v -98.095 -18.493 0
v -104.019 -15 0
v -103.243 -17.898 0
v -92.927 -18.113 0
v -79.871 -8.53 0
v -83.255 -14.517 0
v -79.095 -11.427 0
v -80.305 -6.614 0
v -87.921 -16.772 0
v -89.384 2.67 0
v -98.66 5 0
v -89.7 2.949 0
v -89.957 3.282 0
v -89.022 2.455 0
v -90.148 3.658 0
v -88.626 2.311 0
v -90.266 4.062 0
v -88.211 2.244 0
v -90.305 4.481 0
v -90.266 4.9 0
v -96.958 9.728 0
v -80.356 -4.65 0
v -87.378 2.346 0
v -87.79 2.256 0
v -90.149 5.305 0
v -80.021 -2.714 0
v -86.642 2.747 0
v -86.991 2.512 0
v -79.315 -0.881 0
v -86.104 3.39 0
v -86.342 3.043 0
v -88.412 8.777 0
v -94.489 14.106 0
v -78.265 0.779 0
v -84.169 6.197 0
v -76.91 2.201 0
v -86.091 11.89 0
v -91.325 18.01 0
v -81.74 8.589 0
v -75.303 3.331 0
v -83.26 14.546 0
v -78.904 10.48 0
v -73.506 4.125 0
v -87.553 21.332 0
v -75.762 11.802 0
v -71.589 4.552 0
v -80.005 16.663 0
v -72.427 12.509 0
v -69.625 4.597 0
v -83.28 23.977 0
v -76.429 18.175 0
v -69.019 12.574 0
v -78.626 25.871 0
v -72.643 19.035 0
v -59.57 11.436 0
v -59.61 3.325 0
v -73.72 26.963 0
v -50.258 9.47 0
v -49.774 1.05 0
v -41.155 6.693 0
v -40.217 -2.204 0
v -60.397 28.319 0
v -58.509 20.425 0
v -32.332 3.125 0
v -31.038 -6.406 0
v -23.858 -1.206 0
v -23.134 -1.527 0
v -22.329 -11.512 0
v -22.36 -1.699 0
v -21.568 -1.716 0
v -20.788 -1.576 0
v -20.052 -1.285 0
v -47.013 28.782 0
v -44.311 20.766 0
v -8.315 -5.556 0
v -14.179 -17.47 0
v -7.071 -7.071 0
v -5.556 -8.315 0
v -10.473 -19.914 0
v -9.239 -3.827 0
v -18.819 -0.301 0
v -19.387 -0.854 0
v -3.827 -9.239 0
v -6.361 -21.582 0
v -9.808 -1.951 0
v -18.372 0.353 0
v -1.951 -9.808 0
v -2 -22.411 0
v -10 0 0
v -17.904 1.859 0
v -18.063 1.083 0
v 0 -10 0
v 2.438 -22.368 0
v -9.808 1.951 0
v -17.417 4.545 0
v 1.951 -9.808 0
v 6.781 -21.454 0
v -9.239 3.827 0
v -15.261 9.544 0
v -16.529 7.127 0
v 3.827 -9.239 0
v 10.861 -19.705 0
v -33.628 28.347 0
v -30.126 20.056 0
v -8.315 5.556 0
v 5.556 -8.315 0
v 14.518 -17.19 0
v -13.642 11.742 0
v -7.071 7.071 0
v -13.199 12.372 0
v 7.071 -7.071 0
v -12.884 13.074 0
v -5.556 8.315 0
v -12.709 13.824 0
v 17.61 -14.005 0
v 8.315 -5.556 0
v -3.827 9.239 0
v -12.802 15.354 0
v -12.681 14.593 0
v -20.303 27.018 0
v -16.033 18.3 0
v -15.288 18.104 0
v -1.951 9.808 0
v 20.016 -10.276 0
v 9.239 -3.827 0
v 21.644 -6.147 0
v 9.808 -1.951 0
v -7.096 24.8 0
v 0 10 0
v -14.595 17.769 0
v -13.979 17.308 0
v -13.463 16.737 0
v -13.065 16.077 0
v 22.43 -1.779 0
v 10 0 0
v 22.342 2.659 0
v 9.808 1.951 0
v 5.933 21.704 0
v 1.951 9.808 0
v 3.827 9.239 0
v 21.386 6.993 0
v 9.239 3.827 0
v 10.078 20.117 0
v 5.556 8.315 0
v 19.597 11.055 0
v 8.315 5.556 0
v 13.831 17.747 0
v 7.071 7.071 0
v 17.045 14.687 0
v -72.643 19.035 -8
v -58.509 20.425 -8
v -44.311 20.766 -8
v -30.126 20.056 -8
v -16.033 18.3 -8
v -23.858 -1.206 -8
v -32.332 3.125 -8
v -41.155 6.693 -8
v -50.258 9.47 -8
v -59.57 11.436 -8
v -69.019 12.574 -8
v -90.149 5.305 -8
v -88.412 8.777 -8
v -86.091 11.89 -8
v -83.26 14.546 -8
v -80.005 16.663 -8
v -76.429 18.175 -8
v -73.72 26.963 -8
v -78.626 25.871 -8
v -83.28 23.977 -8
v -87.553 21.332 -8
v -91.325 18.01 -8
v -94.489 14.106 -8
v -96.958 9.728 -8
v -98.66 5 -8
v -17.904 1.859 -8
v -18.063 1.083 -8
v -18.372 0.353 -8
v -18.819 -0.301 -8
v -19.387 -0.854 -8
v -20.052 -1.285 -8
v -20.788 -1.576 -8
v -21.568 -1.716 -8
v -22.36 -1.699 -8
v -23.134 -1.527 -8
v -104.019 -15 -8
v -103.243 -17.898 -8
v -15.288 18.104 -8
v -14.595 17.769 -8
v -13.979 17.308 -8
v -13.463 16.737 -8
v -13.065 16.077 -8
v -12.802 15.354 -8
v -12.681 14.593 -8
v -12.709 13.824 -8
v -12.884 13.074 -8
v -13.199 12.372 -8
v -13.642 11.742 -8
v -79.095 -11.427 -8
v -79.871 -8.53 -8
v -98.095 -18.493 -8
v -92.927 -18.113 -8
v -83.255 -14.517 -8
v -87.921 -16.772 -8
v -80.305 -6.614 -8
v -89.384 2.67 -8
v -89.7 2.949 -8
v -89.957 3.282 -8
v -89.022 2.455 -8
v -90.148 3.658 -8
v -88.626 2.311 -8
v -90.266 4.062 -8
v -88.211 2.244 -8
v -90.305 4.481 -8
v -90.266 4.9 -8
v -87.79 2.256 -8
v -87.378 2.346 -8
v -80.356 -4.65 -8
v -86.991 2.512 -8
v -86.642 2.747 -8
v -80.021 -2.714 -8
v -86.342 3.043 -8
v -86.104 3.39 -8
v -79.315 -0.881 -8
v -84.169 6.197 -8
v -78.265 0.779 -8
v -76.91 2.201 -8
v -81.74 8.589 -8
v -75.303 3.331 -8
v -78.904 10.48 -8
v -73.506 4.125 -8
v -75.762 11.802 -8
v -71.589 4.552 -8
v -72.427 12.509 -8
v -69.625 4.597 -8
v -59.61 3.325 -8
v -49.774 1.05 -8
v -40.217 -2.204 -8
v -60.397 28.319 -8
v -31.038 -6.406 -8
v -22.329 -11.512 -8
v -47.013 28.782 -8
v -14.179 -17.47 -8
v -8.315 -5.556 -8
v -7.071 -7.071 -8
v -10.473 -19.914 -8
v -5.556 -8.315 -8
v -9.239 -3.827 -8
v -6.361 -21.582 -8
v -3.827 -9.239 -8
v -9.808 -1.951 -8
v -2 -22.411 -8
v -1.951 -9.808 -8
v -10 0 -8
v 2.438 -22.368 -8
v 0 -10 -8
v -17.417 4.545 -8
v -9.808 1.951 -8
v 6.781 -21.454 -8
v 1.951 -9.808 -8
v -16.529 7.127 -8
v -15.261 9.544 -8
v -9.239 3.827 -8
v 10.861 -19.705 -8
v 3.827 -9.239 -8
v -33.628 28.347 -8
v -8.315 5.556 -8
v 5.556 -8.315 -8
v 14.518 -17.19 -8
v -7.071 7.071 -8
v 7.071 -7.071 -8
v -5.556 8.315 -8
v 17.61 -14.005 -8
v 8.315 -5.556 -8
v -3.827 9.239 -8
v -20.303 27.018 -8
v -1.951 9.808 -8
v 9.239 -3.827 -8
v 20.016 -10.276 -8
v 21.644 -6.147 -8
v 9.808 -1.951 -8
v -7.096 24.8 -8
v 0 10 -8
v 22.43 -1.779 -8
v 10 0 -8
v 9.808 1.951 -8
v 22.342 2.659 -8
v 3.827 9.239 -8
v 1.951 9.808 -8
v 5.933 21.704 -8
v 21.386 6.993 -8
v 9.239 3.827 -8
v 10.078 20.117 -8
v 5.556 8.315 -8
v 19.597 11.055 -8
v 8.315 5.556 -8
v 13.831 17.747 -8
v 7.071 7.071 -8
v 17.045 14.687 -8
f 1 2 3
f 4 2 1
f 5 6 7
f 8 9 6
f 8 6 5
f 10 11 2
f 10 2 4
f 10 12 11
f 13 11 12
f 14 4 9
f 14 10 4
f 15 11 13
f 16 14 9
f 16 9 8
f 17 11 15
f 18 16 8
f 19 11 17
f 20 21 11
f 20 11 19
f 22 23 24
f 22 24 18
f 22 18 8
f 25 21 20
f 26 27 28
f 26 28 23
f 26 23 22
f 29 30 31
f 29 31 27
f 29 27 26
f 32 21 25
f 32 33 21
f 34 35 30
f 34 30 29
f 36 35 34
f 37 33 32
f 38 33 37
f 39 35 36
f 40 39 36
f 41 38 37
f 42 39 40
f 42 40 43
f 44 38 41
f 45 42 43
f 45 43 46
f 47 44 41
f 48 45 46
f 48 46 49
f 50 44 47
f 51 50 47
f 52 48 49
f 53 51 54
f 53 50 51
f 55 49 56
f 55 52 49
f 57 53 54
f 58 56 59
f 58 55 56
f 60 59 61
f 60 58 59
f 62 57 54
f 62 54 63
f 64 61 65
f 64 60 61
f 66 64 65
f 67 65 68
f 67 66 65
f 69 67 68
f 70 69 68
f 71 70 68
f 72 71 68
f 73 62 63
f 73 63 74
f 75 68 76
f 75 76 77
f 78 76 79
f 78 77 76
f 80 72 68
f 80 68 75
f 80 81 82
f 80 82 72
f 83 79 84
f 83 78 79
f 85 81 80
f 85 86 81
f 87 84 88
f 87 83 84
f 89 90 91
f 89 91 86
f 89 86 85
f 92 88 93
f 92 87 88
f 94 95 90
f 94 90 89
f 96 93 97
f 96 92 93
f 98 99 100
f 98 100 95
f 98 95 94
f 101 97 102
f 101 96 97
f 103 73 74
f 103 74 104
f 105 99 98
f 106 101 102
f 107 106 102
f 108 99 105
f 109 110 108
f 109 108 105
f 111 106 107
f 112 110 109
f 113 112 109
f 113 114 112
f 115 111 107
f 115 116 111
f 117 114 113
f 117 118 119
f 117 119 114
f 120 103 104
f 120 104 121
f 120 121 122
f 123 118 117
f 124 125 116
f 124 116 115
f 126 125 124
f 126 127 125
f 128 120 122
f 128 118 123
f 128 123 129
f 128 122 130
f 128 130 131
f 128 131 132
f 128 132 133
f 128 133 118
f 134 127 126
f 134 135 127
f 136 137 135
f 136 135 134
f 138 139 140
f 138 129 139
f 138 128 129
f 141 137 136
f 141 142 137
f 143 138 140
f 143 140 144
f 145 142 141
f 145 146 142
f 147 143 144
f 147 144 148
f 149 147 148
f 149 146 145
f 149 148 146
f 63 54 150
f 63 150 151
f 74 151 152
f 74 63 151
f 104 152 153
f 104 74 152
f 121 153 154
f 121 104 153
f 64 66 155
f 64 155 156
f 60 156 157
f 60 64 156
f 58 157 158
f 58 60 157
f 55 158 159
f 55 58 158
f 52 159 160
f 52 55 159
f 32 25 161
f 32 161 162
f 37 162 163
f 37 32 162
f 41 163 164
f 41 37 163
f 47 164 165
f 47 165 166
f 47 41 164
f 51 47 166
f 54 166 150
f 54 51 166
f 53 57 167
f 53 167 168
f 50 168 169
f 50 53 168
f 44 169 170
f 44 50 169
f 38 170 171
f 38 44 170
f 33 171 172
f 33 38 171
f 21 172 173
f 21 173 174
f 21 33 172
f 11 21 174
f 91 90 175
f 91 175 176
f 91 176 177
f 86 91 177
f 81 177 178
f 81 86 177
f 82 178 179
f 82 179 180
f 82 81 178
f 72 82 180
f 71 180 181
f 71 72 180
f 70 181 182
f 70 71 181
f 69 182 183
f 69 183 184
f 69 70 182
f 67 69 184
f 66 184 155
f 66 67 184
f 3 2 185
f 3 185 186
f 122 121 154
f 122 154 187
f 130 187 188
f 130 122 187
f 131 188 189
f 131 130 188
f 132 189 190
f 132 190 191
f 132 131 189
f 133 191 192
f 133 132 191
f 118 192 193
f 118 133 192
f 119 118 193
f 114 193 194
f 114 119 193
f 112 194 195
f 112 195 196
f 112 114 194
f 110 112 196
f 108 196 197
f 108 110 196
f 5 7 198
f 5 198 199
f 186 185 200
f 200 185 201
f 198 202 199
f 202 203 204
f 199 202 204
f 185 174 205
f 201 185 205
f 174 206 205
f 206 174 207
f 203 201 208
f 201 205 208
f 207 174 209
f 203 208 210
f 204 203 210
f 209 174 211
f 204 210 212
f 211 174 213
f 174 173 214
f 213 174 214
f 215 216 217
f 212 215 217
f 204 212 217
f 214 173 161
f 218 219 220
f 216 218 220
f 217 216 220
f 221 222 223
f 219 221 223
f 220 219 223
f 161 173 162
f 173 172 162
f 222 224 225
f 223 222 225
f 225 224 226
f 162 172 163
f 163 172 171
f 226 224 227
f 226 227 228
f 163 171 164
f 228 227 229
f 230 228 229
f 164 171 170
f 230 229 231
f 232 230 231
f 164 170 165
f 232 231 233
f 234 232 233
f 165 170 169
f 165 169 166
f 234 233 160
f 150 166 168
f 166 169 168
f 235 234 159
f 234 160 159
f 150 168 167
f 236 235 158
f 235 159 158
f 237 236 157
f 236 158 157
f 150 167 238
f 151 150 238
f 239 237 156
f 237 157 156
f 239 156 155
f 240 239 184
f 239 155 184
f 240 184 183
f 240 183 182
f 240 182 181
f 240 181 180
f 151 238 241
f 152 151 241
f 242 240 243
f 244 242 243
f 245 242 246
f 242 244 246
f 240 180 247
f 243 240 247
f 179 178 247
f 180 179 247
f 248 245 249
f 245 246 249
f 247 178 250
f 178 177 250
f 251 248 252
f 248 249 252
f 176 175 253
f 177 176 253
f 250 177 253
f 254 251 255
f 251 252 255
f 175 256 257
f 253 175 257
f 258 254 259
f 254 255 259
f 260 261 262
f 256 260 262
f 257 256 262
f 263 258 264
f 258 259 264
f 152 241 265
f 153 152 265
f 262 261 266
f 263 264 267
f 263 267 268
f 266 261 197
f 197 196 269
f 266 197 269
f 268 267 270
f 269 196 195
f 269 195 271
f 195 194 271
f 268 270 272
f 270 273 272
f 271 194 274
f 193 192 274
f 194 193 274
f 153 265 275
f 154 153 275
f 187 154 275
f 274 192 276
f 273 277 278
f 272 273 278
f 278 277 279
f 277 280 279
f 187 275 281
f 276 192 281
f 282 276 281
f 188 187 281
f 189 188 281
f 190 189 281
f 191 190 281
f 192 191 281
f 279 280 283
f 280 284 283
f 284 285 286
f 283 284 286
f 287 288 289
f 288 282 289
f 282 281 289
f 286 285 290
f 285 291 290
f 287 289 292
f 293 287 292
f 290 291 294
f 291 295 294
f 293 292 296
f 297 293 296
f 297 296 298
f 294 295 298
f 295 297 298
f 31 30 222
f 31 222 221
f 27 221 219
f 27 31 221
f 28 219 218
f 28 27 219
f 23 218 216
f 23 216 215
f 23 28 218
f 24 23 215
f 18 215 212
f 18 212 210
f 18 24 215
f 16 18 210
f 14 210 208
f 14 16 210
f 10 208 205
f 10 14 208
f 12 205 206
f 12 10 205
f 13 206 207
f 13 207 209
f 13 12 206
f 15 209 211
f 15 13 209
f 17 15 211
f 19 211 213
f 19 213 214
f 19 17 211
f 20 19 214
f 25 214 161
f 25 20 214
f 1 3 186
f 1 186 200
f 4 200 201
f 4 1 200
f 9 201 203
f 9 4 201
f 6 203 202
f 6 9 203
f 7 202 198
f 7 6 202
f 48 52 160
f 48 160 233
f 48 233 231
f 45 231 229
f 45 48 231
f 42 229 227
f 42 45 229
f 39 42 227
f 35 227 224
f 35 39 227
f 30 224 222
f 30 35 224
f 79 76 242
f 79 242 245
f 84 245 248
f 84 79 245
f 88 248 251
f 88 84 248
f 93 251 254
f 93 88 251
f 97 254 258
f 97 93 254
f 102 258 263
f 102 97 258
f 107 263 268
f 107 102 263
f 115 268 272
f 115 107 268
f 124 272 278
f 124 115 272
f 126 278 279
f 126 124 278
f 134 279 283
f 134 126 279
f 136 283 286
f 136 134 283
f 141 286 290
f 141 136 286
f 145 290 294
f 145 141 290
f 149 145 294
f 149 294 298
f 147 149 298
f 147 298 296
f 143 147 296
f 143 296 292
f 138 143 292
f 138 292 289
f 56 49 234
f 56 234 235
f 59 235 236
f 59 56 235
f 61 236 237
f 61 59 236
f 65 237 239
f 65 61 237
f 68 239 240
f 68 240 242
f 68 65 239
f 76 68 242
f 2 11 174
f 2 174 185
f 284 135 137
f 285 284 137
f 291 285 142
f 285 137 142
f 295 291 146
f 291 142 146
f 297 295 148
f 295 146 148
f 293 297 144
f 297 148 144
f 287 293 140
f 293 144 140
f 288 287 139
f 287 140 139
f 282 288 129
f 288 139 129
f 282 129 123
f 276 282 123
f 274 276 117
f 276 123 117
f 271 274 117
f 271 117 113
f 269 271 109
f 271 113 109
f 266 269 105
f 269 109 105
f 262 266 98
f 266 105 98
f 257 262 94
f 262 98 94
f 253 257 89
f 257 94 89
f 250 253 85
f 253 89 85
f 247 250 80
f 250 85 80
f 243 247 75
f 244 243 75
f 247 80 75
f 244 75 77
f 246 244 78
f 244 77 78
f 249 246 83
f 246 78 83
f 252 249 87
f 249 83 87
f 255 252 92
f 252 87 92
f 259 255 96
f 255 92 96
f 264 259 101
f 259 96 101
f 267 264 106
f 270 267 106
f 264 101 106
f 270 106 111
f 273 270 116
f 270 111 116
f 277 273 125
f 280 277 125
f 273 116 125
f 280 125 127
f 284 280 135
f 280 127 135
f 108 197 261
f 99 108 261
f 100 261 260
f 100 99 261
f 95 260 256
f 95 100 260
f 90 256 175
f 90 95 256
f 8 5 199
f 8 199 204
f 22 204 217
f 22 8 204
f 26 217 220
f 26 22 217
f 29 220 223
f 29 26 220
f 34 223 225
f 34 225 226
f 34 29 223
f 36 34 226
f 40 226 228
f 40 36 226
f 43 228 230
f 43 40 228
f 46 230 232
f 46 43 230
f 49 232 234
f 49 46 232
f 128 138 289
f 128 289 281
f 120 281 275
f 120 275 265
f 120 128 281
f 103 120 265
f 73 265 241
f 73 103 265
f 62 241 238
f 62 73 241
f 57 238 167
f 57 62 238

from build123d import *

# Parameters (mm, degrees)
F0_R     = 10
F1_DEPTH = 8


with BuildPart() as f1:
    # F0 (on Top) → F1 (new body)
    with BuildSketch(Plane.XY):
        with BuildLine():
            ThreePointArc((-69.624749, 4.596739), (-40.217301, -2.204414), (-14.178766, -17.470335))
            ThreePointArc((-14.178766, -17.470335), (20.016237, -10.276199), (5.932914, 21.703698))
            ThreePointArc((5.932914, 21.703698), (-33.628428, 28.347466), (-73.71984, 26.962516))
            ThreePointArc((-73.71984, 26.962516), (-89.508922, 19.750139), (-98.660254, 5))
            Line((-98.660254, 5), (-100, 0))
            Line((-100, 0), (-104.019238, -15))
            Line((-104.019238, -15), (-103.242781, -17.897777))
            ThreePointArc((-103.242781, -17.897777), (-90.392251, -17.560317), (-79.094635, -11.427301))
            Line((-79.094635, -11.427301), (-79.871092, -8.529524))
            ThreePointArc((-79.871092, -8.529524), (-78.264558, 0.77869), (-69.624749, 4.596739))
        make_face()
        Circle(F0_R, mode=Mode.SUBTRACT)
        with BuildLine():
            ThreePointArc((-16.033026, 18.300115), (-12.916015, 15.72181), (-13.642437, 11.742398))
            ThreePointArc((-13.642437, 11.742398), (-16.529122, 7.12658), (-17.903763, 1.858839))
            ThreePointArc((-17.903763, 1.858839), (-20.05158, -1.284513), (-23.857845, -1.206234))
            ThreePointArc((-23.857845, -1.206234), (-45.676184, 8.182002), (-69.019088, 12.57378))
            ThreePointArc((-69.019088, 12.57378), (-78.904215, 10.480055), (-86.103752, 3.390197))
            ThreePointArc((-86.103752, 3.390197), (-89.022149, 2.455102), (-90.149125, 5.304904))
            ThreePointArc((-90.149125, 5.304904), (-83.259717, 14.546079), (-72.643211, 19.035293))
            ThreePointArc((-72.643211, 19.035293), (-44.310872, 20.765745), (-16.033026, 18.300115))
        make_face(mode=Mode.SUBTRACT)
    extrude(amount=-F1_DEPTH)


solid = f1.part
